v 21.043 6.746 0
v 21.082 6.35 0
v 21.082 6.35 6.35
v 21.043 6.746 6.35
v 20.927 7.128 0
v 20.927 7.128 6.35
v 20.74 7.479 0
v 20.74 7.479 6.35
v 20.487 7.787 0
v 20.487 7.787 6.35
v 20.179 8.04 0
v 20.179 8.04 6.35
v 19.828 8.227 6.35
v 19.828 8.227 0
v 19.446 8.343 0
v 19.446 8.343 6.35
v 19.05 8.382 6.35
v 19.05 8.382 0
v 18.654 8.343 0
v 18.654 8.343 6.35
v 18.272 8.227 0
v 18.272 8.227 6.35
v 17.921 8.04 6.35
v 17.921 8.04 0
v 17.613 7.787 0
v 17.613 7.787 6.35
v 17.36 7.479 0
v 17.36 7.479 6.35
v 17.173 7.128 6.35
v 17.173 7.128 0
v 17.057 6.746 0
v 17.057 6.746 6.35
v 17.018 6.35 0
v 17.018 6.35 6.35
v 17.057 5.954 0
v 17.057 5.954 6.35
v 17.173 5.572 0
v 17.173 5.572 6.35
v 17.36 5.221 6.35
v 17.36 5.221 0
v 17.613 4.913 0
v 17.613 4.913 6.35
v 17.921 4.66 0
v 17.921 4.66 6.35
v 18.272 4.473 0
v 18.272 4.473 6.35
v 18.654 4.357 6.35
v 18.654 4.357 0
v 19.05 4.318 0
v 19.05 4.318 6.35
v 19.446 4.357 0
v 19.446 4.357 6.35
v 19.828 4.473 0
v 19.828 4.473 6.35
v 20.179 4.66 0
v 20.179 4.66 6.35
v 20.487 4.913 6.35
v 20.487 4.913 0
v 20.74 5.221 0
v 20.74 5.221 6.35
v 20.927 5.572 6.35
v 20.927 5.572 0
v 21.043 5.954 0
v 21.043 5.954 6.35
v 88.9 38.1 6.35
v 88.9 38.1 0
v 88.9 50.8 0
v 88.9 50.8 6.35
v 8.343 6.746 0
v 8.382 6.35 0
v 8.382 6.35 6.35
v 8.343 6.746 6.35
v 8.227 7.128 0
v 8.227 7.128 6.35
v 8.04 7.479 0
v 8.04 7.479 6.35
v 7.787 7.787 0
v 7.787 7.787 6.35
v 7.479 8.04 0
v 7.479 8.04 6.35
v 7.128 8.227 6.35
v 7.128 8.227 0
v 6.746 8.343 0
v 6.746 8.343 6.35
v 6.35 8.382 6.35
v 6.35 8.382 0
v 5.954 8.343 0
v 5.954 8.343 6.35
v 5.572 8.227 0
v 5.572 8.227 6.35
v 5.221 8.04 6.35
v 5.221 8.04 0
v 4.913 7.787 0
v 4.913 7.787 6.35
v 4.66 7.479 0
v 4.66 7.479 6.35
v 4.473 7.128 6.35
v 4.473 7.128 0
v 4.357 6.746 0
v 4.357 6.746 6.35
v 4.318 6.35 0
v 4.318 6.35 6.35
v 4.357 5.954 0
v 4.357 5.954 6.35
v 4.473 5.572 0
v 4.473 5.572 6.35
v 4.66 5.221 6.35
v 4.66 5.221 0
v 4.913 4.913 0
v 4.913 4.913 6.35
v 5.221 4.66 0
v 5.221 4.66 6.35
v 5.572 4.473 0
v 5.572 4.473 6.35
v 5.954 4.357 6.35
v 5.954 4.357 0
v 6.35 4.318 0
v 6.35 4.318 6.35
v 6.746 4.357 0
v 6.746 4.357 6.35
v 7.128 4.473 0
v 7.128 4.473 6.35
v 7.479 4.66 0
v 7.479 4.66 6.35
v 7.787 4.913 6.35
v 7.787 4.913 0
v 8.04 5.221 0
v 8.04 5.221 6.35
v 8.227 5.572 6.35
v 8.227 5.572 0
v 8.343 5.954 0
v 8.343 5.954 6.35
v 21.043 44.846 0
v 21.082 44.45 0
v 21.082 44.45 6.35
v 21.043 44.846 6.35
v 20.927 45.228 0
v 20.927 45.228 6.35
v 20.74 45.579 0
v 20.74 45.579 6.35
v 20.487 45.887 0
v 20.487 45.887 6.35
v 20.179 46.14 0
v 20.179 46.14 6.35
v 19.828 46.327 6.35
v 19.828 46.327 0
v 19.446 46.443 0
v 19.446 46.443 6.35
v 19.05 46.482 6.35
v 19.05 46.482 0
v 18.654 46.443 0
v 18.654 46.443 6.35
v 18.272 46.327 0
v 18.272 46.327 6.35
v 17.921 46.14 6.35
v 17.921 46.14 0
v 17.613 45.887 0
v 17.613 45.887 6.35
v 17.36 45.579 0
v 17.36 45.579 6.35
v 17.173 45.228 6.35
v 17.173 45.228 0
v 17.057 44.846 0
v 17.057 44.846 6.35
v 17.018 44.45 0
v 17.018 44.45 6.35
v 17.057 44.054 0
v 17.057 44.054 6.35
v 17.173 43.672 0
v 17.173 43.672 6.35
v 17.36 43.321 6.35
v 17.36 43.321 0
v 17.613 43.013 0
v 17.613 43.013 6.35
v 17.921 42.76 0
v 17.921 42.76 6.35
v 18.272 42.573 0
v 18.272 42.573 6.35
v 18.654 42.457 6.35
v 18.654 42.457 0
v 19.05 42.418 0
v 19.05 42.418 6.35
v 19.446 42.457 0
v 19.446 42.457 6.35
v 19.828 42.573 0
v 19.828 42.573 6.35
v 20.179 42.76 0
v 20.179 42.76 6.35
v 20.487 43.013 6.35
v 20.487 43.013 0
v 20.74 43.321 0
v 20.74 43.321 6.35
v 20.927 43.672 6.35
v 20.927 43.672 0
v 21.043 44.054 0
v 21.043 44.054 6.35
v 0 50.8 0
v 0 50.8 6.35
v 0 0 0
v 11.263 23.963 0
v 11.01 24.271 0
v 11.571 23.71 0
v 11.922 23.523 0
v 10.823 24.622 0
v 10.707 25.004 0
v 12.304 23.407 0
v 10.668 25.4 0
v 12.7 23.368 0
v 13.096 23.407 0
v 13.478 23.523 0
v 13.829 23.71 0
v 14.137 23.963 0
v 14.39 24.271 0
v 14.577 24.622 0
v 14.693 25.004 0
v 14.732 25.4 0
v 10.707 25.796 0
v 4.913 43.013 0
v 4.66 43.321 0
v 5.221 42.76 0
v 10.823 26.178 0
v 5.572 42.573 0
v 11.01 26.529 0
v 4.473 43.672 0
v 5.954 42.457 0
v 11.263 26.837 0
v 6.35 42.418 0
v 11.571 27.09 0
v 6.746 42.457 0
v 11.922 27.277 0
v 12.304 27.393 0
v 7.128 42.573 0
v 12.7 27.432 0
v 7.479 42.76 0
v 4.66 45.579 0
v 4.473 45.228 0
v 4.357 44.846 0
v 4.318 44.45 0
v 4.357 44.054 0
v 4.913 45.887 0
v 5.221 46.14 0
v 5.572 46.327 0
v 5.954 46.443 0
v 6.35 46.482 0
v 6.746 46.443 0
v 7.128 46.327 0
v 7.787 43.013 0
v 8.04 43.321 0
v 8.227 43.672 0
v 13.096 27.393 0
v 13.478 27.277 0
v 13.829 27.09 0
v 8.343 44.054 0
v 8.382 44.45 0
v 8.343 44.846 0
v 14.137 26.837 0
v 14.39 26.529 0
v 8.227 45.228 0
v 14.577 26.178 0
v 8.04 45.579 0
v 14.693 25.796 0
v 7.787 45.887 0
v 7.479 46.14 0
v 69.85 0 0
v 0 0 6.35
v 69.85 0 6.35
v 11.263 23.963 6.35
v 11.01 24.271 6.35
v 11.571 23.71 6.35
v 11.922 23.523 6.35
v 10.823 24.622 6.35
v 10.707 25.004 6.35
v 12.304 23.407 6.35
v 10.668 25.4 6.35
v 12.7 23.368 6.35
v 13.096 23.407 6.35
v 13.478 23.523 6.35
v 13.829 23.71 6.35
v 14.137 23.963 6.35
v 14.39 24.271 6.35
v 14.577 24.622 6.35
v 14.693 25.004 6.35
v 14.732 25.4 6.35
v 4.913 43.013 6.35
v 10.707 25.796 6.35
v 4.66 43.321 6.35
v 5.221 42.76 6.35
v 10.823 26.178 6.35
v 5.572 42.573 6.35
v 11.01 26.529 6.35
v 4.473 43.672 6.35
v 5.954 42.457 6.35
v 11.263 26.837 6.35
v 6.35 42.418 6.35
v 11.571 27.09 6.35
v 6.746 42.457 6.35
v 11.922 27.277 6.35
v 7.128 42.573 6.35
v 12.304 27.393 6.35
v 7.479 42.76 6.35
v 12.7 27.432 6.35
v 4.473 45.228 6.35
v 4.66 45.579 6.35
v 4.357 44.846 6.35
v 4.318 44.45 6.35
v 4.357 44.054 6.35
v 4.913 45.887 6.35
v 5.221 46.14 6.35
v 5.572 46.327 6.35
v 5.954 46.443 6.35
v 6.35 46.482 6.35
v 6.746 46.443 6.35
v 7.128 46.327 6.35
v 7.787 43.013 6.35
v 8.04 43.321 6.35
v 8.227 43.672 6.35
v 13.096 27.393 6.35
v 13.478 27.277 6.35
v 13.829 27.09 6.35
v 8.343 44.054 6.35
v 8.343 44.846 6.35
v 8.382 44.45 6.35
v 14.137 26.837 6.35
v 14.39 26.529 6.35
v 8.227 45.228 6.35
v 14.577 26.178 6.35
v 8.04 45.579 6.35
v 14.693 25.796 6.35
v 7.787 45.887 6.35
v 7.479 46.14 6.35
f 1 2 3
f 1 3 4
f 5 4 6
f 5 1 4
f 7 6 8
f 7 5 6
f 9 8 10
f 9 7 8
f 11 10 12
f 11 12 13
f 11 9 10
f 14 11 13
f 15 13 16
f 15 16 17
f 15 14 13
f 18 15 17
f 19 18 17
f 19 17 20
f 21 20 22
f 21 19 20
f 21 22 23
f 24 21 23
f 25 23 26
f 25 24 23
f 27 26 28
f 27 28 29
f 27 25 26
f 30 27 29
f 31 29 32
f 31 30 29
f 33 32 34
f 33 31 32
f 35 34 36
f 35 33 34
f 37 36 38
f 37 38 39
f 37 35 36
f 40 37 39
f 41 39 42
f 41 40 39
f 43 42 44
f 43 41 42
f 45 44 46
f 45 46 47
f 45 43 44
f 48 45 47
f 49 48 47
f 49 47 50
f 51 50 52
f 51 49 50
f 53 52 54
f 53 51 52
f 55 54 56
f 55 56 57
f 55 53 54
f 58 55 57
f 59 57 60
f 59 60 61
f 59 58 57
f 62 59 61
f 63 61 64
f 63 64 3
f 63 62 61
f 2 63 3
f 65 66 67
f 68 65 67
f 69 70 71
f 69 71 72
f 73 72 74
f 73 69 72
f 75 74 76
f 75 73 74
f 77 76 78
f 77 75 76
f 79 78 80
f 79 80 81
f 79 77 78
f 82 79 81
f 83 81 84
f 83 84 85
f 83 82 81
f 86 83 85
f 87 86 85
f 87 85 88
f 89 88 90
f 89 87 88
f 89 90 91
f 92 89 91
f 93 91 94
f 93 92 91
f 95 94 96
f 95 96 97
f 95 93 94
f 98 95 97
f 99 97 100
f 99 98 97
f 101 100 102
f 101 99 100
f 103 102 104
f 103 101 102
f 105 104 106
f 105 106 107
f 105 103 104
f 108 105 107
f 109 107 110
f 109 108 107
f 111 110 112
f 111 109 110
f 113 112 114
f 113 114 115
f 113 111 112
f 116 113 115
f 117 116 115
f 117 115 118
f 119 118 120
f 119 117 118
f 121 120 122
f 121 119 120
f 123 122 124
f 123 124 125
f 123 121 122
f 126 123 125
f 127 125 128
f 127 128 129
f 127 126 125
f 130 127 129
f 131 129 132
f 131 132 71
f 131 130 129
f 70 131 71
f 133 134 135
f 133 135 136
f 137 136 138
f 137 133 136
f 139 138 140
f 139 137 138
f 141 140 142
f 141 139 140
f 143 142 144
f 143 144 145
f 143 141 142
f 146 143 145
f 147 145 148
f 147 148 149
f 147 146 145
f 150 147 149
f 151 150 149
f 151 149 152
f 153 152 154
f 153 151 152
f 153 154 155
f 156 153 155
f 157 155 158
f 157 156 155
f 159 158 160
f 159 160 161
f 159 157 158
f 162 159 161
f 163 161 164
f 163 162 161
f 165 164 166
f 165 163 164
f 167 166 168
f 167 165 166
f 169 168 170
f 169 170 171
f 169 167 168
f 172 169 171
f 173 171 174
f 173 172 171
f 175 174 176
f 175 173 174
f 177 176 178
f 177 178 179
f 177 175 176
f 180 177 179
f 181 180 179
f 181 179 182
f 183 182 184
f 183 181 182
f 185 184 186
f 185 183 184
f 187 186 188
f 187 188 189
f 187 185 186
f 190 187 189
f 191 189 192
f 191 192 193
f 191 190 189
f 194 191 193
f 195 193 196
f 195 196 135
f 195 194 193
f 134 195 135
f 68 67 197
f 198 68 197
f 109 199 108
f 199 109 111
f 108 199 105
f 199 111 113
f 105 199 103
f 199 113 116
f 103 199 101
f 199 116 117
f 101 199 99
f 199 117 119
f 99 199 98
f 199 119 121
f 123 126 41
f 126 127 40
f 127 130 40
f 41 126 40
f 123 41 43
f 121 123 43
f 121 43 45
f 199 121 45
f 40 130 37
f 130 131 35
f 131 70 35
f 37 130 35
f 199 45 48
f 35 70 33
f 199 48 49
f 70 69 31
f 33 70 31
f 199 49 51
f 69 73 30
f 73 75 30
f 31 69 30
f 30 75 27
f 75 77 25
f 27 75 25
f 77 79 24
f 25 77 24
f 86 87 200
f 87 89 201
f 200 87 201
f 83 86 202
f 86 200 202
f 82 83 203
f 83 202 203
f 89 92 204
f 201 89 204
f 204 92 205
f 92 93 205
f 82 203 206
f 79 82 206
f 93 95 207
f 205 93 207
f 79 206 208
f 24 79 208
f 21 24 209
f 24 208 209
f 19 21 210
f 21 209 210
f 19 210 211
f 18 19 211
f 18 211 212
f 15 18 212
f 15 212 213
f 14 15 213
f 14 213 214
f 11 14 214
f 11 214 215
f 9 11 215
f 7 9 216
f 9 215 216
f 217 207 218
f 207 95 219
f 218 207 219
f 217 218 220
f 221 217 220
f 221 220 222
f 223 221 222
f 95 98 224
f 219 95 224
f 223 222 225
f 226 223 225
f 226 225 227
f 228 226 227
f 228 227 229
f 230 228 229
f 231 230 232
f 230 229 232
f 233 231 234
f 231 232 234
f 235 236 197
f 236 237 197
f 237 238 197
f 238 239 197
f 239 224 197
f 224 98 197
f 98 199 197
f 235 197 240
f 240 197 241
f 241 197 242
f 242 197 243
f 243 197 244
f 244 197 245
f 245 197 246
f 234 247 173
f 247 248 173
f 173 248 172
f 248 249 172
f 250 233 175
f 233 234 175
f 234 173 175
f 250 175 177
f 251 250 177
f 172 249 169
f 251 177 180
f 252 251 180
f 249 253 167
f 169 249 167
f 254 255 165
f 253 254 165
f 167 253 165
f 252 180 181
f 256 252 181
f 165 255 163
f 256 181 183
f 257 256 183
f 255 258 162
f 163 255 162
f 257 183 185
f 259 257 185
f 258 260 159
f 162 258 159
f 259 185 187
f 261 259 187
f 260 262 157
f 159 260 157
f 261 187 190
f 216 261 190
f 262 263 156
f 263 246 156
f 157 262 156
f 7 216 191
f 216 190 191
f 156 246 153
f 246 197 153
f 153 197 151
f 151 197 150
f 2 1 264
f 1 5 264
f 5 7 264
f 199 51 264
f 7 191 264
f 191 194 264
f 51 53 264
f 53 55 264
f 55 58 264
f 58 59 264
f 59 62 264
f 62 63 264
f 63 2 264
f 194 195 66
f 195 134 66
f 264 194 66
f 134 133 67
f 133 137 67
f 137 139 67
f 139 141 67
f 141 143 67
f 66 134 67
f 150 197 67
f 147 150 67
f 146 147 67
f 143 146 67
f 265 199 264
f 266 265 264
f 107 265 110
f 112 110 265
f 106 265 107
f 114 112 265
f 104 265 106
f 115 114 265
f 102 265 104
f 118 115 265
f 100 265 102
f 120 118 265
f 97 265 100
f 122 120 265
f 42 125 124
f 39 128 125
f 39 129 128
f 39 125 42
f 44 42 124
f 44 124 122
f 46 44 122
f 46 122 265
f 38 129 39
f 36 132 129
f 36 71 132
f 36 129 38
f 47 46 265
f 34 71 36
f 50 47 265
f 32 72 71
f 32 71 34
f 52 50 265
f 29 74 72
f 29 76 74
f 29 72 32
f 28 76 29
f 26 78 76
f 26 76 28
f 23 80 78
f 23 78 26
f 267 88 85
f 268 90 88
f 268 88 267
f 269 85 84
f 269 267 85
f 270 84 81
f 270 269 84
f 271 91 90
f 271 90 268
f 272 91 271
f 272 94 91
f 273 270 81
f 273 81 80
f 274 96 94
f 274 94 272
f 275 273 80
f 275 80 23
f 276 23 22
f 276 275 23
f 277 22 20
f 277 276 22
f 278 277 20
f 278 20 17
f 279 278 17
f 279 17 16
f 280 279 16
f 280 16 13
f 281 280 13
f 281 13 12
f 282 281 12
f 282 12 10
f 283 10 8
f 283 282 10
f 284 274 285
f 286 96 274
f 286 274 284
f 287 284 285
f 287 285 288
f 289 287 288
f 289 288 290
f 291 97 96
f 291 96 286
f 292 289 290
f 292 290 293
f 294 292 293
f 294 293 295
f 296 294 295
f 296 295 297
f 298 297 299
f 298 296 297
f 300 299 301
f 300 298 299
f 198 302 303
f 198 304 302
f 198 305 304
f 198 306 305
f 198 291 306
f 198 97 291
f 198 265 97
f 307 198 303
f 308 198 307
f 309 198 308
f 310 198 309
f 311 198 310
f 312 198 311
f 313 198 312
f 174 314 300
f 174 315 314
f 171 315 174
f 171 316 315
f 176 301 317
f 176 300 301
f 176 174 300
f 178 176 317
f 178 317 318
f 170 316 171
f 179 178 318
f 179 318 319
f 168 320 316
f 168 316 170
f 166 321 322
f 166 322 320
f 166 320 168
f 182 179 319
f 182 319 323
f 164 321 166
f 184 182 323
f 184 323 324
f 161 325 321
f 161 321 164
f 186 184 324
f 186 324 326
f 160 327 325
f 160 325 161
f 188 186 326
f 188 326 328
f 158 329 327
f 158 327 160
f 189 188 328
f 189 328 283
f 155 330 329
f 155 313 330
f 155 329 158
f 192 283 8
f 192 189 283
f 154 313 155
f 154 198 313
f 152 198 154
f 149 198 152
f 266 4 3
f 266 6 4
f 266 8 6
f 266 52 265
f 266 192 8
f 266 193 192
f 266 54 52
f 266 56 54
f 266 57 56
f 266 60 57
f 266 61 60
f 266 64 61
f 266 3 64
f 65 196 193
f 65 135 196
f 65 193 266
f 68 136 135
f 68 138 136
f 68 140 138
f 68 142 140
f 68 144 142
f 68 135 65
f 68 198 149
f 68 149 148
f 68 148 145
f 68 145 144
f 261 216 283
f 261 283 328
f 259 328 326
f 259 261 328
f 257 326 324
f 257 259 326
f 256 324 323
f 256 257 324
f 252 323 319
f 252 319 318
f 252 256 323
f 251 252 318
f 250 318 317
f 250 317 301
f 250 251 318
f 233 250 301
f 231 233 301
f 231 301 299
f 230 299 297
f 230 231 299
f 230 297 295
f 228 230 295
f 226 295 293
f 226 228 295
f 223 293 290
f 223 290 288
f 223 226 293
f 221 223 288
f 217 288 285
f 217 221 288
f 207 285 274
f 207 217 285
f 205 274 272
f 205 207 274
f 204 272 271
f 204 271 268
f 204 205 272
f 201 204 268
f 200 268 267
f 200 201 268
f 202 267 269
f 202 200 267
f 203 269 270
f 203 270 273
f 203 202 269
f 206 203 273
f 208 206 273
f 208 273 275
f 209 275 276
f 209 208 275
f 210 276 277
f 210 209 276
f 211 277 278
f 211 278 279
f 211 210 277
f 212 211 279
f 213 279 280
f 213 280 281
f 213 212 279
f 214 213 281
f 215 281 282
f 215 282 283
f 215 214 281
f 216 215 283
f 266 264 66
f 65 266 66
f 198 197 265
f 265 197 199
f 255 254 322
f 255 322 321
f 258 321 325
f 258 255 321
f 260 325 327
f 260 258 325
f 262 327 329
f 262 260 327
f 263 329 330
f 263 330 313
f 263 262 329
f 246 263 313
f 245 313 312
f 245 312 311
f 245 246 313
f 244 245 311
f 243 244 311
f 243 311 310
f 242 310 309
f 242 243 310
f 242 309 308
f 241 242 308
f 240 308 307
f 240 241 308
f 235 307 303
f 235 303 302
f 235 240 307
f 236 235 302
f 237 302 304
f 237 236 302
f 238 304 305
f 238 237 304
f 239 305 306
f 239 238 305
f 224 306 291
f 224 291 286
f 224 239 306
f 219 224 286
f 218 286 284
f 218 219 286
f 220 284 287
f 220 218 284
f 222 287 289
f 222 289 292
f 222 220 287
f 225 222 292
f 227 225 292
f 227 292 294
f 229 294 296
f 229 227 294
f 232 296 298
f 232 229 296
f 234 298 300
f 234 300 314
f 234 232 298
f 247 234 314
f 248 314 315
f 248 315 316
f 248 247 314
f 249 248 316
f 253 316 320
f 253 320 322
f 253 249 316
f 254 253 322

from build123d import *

# Parameters (mm, degrees)
SKETCH1_R           = 2.032
BOSS_EXTRUDE1_DEPTH = 6.35


with BuildPart() as part:
    # Sketch1 → Boss-Extrude1 (new body)
    with BuildSketch(Plane.XY):
        Polygon((69.85, 0), (88.9, 38.1), (88.9, 50.8), (0, 50.8), (0, 0), align=None)
        with Locations((6.35, 6.35)):
            Circle(SKETCH1_R, mode=Mode.SUBTRACT)
        with Locations((19.05, 6.35)):
            Circle(SKETCH1_R, mode=Mode.SUBTRACT)
        with Locations((19.05, 44.45)):
            Circle(SKETCH1_R, mode=Mode.SUBTRACT)
        with Locations((6.35, 44.45)):
            Circle(SKETCH1_R, mode=Mode.SUBTRACT)
        with Locations((12.7, 25.4)):
            Circle(SKETCH1_R, mode=Mode.SUBTRACT)
    extrude(amount=BOSS_EXTRUDE1_DEPTH)


solid = part.part
